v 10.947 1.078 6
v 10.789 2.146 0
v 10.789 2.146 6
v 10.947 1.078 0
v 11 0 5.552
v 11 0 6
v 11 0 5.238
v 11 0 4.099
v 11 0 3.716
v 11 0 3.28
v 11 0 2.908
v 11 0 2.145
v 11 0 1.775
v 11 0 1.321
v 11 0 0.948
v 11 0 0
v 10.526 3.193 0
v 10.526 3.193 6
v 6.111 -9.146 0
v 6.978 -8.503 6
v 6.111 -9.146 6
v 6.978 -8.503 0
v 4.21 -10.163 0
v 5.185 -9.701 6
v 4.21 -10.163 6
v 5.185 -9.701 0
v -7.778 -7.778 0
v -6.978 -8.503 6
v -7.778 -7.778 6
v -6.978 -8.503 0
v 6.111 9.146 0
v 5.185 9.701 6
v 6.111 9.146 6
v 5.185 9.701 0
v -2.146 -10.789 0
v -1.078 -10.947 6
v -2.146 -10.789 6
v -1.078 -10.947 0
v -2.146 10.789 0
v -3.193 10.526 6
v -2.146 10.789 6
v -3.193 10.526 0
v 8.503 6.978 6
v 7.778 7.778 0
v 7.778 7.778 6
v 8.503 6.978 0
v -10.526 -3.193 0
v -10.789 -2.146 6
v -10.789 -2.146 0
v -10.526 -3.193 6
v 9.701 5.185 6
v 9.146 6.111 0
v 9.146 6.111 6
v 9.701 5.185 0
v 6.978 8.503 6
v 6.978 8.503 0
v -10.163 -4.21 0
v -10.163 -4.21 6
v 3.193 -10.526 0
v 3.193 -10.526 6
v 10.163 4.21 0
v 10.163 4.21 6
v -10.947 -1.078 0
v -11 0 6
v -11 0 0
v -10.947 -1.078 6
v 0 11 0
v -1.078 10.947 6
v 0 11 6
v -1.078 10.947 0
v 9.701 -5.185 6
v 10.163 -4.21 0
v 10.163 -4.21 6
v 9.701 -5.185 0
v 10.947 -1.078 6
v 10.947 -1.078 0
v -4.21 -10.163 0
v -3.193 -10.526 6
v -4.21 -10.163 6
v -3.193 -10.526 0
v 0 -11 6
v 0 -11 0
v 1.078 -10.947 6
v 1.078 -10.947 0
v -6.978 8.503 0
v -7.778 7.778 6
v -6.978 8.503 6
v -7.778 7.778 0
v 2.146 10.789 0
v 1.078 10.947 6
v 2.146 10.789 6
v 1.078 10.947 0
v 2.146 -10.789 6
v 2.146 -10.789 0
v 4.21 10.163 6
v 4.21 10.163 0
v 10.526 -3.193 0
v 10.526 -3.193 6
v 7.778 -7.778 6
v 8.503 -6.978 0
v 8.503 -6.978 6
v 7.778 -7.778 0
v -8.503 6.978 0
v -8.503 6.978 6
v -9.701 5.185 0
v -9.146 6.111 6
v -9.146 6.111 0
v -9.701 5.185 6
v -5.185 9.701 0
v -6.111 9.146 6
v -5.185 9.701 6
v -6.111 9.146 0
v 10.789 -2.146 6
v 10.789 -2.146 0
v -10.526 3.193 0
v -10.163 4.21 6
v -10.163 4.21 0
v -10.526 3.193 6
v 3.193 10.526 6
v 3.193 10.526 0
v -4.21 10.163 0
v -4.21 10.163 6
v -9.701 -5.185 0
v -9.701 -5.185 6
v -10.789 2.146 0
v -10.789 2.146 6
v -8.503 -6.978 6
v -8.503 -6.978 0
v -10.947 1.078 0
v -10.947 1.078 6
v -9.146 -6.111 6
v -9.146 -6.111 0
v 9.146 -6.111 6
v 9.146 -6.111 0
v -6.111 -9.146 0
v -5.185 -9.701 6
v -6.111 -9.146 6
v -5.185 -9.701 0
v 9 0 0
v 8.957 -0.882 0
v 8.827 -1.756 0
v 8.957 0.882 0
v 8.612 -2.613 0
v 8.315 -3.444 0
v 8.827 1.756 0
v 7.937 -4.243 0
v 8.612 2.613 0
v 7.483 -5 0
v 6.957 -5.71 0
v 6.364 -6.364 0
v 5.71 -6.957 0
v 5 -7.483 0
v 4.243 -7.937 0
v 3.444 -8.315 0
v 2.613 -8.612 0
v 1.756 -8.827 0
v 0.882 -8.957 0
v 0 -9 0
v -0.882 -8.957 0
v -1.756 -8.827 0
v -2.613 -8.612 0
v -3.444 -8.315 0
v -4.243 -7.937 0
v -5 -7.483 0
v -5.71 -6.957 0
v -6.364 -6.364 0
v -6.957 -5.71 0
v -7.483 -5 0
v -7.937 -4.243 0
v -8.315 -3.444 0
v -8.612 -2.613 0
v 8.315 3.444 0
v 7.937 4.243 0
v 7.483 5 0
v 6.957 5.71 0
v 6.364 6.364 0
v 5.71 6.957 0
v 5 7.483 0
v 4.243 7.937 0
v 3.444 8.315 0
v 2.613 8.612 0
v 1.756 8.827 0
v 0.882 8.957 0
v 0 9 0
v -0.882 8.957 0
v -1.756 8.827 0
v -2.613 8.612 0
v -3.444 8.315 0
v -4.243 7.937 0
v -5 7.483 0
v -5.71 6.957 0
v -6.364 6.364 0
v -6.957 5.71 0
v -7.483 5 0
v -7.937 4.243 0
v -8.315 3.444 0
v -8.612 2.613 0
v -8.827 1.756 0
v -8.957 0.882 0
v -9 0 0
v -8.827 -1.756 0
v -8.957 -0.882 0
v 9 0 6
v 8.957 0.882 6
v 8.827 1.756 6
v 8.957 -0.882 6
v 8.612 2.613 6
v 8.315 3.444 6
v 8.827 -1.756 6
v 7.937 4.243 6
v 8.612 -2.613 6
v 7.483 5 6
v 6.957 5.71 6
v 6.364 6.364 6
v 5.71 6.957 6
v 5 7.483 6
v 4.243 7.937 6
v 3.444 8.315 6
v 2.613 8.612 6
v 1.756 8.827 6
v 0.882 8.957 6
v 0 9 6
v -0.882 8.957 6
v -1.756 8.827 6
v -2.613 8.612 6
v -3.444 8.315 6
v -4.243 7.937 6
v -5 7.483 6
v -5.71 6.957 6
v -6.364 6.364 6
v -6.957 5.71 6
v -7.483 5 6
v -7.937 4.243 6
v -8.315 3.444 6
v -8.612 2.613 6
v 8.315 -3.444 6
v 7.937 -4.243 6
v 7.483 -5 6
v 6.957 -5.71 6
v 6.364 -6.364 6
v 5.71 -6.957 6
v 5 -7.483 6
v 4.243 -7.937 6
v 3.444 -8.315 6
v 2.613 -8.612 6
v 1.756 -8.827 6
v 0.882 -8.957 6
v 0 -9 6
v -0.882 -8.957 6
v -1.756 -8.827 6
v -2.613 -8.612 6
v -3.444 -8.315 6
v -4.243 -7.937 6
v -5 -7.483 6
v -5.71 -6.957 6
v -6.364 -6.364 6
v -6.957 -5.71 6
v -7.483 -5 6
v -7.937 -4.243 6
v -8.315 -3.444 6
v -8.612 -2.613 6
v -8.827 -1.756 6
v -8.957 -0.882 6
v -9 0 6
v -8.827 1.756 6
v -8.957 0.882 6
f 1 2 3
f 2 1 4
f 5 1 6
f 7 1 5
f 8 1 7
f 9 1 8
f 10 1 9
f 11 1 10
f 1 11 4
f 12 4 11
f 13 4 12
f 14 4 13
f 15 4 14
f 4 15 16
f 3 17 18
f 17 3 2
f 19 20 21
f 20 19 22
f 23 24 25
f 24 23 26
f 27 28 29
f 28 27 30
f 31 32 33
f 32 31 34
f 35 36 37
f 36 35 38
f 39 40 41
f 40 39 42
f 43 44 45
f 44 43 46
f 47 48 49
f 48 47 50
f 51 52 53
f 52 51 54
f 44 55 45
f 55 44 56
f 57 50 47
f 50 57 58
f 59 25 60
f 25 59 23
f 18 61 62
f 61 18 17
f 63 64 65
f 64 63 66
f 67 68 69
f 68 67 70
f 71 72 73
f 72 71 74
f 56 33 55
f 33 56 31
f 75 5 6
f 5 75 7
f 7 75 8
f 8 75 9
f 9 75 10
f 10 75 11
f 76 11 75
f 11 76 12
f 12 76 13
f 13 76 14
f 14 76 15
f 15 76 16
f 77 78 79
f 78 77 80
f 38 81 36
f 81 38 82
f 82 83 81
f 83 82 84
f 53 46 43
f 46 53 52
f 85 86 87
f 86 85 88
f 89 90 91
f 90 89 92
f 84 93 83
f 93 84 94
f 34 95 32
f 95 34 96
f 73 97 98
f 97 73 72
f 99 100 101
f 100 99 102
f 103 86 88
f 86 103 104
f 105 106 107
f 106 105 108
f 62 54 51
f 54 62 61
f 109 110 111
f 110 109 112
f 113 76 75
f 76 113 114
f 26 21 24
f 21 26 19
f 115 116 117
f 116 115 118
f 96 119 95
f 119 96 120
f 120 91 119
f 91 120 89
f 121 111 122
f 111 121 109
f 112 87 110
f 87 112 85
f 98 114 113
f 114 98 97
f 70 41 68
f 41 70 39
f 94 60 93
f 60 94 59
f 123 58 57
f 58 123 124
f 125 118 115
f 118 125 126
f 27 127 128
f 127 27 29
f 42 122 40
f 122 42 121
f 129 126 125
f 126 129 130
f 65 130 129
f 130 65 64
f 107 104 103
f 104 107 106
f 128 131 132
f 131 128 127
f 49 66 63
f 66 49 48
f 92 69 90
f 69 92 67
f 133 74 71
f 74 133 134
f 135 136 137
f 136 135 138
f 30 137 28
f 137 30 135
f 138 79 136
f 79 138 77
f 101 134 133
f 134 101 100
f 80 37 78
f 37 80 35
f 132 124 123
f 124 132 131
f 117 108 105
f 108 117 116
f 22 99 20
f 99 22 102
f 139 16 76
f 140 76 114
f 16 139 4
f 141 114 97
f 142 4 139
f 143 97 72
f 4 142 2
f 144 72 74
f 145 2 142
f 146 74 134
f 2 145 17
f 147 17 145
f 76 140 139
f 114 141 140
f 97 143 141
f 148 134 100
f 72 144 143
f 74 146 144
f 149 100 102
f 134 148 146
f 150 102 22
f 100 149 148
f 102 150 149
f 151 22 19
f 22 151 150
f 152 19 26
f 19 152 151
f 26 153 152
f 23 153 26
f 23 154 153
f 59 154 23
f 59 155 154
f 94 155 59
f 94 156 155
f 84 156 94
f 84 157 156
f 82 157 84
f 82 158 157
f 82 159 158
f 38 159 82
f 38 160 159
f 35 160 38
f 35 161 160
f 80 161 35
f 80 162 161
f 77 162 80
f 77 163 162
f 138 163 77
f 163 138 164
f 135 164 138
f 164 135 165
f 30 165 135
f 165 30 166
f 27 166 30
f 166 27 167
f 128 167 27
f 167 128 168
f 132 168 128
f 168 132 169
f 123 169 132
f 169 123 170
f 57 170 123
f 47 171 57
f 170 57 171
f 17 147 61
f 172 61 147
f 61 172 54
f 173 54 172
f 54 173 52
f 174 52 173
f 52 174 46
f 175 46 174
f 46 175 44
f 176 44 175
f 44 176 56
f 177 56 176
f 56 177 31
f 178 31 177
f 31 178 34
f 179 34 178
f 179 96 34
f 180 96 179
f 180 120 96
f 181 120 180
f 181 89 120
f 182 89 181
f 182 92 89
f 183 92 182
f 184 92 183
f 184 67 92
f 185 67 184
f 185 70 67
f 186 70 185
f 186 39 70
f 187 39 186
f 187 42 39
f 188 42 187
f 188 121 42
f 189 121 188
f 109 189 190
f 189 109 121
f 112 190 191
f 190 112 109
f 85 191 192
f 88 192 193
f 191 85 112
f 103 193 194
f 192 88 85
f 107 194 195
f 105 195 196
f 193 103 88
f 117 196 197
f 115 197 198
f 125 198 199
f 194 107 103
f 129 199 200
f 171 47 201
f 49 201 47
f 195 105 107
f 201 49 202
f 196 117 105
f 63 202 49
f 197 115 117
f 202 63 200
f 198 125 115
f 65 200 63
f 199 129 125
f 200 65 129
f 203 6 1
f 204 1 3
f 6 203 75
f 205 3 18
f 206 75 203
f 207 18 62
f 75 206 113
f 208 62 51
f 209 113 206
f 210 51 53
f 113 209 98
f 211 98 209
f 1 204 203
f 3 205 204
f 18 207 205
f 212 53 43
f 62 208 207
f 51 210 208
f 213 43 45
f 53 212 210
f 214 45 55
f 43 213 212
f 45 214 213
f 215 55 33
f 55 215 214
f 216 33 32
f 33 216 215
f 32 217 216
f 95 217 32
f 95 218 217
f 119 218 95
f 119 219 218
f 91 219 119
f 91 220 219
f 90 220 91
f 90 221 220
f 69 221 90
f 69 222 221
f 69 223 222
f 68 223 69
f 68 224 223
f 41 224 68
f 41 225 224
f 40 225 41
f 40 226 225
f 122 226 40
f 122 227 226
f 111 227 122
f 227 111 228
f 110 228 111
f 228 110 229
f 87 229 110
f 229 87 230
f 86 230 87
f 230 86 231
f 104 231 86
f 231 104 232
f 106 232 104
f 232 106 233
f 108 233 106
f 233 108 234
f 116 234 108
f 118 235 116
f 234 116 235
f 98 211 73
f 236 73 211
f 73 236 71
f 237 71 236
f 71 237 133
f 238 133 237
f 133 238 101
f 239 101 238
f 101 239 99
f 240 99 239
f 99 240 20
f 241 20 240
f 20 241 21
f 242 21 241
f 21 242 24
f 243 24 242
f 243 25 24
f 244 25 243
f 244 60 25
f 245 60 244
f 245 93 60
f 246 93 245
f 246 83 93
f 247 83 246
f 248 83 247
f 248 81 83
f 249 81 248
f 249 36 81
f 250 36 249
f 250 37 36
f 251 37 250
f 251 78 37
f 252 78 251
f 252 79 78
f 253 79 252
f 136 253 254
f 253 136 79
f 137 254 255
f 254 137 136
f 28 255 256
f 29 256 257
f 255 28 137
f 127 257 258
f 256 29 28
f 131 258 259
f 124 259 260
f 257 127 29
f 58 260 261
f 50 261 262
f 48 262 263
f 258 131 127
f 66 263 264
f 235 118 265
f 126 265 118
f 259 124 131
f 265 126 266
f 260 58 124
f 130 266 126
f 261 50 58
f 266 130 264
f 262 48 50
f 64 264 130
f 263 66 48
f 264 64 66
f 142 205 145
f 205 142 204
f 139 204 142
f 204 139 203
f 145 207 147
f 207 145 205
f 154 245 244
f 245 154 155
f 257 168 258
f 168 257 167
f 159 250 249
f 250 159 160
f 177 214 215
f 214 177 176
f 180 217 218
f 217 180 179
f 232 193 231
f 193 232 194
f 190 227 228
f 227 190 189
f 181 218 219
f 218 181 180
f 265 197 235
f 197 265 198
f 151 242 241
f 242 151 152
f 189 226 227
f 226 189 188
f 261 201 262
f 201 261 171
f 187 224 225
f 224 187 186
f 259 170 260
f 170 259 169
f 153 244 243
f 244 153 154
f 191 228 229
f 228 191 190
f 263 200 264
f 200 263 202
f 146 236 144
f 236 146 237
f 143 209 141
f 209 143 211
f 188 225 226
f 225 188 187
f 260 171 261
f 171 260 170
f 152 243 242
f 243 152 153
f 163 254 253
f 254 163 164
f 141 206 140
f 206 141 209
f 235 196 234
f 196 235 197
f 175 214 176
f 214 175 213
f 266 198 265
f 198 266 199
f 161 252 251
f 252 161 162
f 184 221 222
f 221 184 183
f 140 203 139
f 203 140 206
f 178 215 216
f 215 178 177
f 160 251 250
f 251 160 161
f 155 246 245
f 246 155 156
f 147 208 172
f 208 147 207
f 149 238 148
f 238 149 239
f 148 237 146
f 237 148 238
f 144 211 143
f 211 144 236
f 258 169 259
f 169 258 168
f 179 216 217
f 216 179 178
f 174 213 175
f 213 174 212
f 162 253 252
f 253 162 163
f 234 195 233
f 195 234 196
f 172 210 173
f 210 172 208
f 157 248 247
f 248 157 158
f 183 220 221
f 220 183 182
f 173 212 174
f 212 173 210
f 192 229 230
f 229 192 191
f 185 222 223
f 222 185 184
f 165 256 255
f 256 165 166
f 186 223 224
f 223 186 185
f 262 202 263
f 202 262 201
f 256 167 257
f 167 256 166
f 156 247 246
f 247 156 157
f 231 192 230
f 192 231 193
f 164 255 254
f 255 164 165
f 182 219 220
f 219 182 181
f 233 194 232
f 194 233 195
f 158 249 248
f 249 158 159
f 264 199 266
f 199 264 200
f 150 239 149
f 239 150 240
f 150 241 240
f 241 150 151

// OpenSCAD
// expect: text("love") doesn't touch the shape it is cut from
// An AI's ring with "love" engraved on the outside: the text starts at the outer surface and is
// extruded outward, so it cuts nothing.
outer_diameter = 22;
inner_diameter = 18;
ring_height = 6;
text_size = 3;
text_depth = 0.6;
difference() {
    cylinder(d=outer_diameter, h=ring_height, $fn=64);
    translate([0, 0, -0.1])
    cylinder(d=inner_diameter, h=ring_height+0.2, $fn=64);
    translate([outer_diameter/2, 0, ring_height/2])
    rotate([0, 90, 0])
    linear_extrude(height=text_depth+0.1)
    text("love", size=text_size, halign="center", valign="center", font="Liberation Sans");
}
